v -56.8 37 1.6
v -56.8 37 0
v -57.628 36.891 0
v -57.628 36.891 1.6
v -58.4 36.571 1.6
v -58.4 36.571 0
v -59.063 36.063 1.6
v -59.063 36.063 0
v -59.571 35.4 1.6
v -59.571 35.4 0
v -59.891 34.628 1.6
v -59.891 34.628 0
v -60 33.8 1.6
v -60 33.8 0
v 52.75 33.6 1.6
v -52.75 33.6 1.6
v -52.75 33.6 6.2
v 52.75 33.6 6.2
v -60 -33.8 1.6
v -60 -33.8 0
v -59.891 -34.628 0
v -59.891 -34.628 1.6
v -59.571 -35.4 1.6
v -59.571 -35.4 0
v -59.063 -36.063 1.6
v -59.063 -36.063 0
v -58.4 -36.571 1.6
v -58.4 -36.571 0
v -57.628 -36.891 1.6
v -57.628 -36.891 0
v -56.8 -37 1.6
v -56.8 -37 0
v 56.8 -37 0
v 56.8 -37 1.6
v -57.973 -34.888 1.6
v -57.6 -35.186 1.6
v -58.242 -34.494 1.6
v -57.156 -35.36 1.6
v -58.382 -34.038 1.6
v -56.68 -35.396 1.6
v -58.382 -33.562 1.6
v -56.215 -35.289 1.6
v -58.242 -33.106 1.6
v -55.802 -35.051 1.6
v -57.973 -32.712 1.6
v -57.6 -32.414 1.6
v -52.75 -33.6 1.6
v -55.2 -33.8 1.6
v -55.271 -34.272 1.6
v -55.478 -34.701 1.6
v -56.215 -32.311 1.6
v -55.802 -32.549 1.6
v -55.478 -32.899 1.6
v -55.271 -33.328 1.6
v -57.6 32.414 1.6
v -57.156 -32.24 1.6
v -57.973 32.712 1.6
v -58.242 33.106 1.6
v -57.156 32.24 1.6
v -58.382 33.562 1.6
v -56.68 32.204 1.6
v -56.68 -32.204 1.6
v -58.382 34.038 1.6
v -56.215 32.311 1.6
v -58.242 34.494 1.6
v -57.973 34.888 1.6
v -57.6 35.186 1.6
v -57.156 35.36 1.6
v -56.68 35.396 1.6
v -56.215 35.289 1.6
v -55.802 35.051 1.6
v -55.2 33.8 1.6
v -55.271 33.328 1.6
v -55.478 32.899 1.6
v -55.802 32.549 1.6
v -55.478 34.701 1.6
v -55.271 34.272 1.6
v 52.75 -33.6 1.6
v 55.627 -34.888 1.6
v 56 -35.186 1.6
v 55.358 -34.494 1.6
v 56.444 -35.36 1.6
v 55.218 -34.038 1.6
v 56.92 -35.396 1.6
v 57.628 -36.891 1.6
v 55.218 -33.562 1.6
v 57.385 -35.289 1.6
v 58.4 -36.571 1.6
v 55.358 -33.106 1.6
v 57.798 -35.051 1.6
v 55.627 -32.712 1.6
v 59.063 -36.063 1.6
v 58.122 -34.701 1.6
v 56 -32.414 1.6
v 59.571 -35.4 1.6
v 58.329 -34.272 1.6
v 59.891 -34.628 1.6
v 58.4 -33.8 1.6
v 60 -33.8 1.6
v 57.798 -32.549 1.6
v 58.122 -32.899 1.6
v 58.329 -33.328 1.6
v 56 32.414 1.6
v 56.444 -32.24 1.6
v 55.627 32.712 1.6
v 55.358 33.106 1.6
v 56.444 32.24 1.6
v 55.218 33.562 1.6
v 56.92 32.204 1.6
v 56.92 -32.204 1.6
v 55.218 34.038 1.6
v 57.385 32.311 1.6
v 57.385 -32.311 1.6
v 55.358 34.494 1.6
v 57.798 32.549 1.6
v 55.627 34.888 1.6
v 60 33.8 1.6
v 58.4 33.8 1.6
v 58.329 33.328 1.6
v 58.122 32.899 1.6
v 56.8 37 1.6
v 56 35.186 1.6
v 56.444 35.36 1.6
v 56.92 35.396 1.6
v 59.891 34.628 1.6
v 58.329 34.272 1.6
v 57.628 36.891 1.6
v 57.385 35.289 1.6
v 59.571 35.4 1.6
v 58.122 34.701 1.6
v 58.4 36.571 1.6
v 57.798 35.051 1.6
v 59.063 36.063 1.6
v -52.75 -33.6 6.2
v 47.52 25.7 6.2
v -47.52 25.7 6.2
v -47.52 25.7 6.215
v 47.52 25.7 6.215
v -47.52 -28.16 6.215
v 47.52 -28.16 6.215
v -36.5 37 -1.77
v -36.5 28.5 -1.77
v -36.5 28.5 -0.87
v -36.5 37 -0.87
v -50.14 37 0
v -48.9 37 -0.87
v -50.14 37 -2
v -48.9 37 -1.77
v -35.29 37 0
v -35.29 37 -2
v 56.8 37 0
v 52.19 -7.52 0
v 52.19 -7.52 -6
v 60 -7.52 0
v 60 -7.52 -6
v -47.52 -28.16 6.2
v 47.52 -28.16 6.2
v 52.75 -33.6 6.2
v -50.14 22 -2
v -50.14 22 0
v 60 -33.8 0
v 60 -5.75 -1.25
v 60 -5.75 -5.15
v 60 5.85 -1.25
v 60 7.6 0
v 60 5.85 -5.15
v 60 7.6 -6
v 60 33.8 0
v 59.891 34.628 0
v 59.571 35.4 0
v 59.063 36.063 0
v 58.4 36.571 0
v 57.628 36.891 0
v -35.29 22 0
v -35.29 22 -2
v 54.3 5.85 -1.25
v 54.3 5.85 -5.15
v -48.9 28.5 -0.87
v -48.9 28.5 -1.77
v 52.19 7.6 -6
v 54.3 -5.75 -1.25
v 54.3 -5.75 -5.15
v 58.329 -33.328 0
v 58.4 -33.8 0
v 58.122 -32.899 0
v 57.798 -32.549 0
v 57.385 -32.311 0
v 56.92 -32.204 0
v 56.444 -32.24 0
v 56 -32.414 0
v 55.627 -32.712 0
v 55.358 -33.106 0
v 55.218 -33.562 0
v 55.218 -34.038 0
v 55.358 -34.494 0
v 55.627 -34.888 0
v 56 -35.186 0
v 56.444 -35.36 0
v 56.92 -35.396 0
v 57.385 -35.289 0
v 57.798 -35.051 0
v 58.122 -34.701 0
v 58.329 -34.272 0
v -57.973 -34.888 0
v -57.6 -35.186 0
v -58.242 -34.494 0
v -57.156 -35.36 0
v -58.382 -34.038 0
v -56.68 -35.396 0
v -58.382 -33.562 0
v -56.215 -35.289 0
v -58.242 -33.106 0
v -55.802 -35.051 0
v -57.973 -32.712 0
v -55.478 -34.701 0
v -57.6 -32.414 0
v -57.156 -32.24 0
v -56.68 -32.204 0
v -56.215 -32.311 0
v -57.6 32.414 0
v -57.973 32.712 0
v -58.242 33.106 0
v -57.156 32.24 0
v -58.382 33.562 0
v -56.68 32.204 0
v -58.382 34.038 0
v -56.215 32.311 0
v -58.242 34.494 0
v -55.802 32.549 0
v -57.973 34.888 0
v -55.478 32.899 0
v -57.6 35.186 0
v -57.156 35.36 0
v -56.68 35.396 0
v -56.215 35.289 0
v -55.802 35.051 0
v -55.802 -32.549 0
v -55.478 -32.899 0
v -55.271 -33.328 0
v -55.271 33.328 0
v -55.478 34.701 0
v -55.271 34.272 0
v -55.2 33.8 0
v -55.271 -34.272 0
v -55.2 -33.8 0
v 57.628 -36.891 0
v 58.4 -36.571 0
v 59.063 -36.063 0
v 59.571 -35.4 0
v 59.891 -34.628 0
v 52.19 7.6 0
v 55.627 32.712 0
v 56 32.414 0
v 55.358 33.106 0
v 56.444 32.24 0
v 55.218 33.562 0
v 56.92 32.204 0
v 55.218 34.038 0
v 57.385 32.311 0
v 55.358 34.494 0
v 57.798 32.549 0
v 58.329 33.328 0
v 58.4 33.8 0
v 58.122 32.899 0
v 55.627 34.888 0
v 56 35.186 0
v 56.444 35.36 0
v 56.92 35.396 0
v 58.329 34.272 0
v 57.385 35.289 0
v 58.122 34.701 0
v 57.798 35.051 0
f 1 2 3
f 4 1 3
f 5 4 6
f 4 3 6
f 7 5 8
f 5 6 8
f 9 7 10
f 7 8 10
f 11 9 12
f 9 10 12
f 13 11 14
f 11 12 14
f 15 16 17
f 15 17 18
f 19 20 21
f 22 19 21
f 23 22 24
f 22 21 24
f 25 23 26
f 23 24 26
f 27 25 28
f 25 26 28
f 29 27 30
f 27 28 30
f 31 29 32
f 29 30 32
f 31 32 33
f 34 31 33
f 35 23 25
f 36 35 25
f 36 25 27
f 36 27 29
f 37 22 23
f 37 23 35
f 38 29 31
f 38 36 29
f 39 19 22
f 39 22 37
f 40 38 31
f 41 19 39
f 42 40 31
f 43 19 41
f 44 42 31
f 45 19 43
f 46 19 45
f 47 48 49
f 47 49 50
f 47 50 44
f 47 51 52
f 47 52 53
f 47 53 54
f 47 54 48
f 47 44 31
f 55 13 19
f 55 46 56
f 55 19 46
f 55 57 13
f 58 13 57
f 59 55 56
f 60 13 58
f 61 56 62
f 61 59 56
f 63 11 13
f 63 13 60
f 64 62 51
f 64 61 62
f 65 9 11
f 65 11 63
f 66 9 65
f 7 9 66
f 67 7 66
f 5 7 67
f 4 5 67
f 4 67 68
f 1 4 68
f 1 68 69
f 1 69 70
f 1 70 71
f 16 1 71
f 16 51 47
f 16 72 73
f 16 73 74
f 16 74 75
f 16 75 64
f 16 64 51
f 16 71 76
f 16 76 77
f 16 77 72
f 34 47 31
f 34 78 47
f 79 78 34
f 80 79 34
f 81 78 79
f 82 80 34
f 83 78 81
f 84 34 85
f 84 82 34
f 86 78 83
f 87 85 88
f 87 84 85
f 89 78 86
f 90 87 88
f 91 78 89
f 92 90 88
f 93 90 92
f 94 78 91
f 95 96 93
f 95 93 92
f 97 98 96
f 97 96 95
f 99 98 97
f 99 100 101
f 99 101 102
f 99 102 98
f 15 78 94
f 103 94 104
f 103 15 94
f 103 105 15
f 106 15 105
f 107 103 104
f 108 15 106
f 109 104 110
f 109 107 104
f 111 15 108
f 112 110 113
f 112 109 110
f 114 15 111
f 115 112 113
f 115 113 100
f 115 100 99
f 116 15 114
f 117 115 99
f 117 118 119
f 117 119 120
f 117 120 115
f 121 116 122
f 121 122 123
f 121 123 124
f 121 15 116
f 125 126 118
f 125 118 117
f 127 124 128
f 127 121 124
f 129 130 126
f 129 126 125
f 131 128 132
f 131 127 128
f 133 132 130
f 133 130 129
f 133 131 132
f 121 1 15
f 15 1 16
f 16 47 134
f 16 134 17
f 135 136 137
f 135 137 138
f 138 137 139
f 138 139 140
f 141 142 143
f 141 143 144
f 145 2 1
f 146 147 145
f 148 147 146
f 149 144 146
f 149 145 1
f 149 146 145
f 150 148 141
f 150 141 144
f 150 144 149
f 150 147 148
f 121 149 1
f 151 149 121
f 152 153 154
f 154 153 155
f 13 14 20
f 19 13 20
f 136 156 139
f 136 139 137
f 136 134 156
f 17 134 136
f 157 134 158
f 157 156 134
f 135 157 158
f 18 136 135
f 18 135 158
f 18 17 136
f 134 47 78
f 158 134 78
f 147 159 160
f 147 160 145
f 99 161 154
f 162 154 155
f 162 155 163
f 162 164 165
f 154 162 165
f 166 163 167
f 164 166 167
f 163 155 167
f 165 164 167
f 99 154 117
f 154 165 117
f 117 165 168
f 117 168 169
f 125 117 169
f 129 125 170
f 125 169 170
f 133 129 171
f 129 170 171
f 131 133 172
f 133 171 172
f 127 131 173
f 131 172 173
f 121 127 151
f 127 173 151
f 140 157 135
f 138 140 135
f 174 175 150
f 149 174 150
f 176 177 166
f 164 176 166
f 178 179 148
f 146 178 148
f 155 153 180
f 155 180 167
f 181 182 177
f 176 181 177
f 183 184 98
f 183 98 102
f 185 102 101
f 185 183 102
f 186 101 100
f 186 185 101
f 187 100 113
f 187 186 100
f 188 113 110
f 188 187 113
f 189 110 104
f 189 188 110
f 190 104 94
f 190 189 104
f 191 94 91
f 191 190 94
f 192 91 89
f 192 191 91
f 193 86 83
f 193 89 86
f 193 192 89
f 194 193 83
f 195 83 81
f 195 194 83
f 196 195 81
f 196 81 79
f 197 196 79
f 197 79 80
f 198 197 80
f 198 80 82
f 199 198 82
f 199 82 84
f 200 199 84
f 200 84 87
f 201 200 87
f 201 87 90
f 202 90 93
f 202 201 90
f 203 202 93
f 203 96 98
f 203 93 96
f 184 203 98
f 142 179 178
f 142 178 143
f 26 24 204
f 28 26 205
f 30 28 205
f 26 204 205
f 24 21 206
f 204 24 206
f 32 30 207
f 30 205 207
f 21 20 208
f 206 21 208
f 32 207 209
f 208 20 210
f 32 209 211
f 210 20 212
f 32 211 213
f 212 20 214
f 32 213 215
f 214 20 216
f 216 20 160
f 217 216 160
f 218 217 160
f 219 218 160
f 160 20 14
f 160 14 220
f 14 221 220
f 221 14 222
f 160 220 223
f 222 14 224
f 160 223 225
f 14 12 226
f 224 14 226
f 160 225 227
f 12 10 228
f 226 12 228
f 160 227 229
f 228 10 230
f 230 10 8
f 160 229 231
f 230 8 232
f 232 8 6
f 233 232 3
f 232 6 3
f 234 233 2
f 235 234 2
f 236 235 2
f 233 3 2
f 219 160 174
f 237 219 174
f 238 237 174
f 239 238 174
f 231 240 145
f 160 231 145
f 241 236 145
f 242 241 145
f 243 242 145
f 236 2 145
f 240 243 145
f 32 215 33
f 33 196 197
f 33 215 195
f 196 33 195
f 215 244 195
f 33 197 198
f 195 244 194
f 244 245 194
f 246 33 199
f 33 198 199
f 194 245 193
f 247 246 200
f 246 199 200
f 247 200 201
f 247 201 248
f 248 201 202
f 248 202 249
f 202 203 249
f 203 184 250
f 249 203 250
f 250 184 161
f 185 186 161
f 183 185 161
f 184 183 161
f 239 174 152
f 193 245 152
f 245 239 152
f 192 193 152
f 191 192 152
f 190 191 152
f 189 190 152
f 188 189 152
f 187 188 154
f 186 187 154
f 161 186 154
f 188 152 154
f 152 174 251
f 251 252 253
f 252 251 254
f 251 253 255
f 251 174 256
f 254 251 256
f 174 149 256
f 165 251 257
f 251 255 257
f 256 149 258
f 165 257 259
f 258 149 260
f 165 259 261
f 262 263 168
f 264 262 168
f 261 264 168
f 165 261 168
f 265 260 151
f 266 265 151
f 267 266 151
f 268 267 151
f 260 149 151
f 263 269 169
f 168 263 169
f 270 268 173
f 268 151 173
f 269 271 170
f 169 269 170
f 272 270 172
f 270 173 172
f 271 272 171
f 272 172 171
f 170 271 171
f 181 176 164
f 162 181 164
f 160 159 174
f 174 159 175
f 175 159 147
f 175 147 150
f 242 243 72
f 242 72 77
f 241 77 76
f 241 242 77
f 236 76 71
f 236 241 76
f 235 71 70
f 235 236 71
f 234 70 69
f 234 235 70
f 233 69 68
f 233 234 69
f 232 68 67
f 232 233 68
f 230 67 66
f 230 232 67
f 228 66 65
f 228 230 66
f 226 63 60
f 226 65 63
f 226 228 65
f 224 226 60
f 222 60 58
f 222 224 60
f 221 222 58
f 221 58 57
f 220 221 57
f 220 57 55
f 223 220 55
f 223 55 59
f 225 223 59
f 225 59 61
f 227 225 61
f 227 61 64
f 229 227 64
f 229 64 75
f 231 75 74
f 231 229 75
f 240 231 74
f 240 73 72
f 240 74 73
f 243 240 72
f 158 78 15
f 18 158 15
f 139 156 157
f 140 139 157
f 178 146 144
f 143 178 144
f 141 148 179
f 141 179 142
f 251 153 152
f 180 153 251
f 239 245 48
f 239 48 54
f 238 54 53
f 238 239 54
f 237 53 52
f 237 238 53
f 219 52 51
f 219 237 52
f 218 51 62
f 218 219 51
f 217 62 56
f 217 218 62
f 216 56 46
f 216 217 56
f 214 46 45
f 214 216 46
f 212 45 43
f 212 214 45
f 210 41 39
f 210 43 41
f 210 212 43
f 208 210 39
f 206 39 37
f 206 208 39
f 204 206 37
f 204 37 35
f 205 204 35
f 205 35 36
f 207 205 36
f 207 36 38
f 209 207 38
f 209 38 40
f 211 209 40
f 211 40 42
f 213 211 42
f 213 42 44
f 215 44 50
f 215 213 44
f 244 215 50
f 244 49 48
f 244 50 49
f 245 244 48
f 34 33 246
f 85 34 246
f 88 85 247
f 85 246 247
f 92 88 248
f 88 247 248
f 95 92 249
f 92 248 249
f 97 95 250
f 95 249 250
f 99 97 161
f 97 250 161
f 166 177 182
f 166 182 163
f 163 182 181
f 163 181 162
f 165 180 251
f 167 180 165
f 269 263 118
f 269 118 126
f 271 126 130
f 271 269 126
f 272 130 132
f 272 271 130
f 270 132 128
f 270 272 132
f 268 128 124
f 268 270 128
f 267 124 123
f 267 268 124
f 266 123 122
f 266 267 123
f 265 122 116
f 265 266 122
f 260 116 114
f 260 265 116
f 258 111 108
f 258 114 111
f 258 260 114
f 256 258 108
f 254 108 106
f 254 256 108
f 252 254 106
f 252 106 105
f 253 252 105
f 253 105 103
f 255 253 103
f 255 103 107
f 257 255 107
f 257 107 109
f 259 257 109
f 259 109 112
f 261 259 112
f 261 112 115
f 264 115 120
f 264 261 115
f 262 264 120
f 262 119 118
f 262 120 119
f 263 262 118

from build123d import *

# Parameters (mm, degrees)
F_120_X_74_PCB_OUTLINE_DEPTH               = 1.6
F_4_START                                  = -0.1
F_4_X_D3_2_PITCH_113_6_X_67_6_PROFILE_R    = 1.6
F_4_X_D3_2_PITCH_113_6_X_67_6_DEPTH        = 1.8
F_105_50_START                             = 1.55
F_105_50_X_67_20_LCD_MODULE_PROFILE_W      = 105.5
F_105_50_X_67_20_LCD_MODULE_PROFILE_H      = 67.2
F_105_50_X_67_20_LCD_MODULE_DEPTH          = 3.45
TOUCH_START                                = 4.98
TOUCH_PANEL_BLACK_BORDER_PROFILE_W         = 105.5
TOUCH_PANEL_BLACK_BORDER_PROFILE_H         = 67.2
TOUCH_PANEL_BLACK_BORDER_DEPTH             = 1.22
VISIBLE_START                              = 6.17
VISIBLE_480_X_272_DISPLAY_AREA_PROFILE_W   = 95.04
VISIBLE_480_X_272_DISPLAY_AREA_PROFILE_H   = 53.86
VISIBLE_480_X_272_DISPLAY_AREA_DEPTH       = 0.045
REAR_START                                 = -6
REAR_4_PIN_UART_CONNECTOR_HOUSING_PROFIL_W = 7.81
REAR_4_PIN_UART_CONNECTOR_HOUSING_PROFIL_H = 15.12
REAR_4_PIN_UART_CONNECTOR_HOUSING_DEPTH    = 6.05
UART_START                                 = -5.15
UART_CONNECTOR_SOCKET_PROFILE_W            = 5.9
UART_CONNECTOR_SOCKET_PROFILE_H            = 11.6
UART_CONNECTOR_SOCKET_DEPTH                = 3.9
REAR_START_2                               = -2
REAR_CARD_HOLDER_PROFILE_W                 = 14.85
REAR_CARD_HOLDER_PROFILE_H                 = 15
REAR_CARD_HOLDER_DEPTH                     = 2.05
CARD_START                                 = -1.77
CARD_OPENING_PROFILE_W                     = 12.4
CARD_OPENING_PROFILE_H                     = 8.7
CARD_OPENING_DEPTH                         = 0.9


with BuildPart() as part:
    # 120 x 74 PCB outline profile → 120 x 74 PCB outline (new body)
    with BuildSketch(Plane.XY):
        with BuildLine():
            Line((-56.8, -37), (56.8, -37))
            ThreePointArc((56.8, -37), (59.0627417, -36.0627417), (60, -33.8))
            Line((60, -33.8), (60, 33.8))
            ThreePointArc((60, 33.8), (59.0627417, 36.0627417), (56.8, 37))
            Line((56.8, 37), (-56.8, 37))
            ThreePointArc((-56.8, 37), (-59.0627417, 36.0627417), (-60, 33.8))
            Line((-60, 33.8), (-60, -33.8))
            ThreePointArc((-60, -33.8), (-59.0627417, -36.0627417), (-56.8, -37))
        make_face()
    extrude(amount=F_120_X_74_PCB_OUTLINE_DEPTH)

    # 4 x D3.2 - pitch 113.6 x 67.6 profile → 4 x D3.2 - pitch 113.6 x 67.6 (cut)
    with BuildSketch(Plane.XY.offset(F_4_START)):
        with Locations((-56.8, -33.8)):
            Circle(F_4_X_D3_2_PITCH_113_6_X_67_6_PROFILE_R)
        with Locations((-56.8, 33.8)):
            Circle(F_4_X_D3_2_PITCH_113_6_X_67_6_PROFILE_R)
        with Locations((56.8, -33.8)):
            Circle(F_4_X_D3_2_PITCH_113_6_X_67_6_PROFILE_R)
        with Locations((56.8, 33.8)):
            Circle(F_4_X_D3_2_PITCH_113_6_X_67_6_PROFILE_R)
    extrude(amount=F_4_X_D3_2_PITCH_113_6_X_67_6_DEPTH, mode=Mode.SUBTRACT)

    # 105.50 x 67.20 LCD module profile → 105.50 x 67.20 LCD module (add)
    with BuildSketch(Plane.XY.offset(F_105_50_START)):
        Rectangle(F_105_50_X_67_20_LCD_MODULE_PROFILE_W, F_105_50_X_67_20_LCD_MODULE_PROFILE_H)
    extrude(amount=F_105_50_X_67_20_LCD_MODULE_DEPTH)

    # Touch panel - black border profile → Touch panel - black border (add)
    with BuildSketch(Plane.XY.offset(TOUCH_START)):
        Rectangle(TOUCH_PANEL_BLACK_BORDER_PROFILE_W, TOUCH_PANEL_BLACK_BORDER_PROFILE_H)
    extrude(amount=TOUCH_PANEL_BLACK_BORDER_DEPTH)

    # Visible 480 x 272 display area profile → Visible 480 x 272 display area (add)
    with BuildSketch(Plane.XY.offset(VISIBLE_START)):
        with Locations((0, -1.23)):
            Rectangle(VISIBLE_480_X_272_DISPLAY_AREA_PROFILE_W, VISIBLE_480_X_272_DISPLAY_AREA_PROFILE_H)
    extrude(amount=VISIBLE_480_X_272_DISPLAY_AREA_DEPTH)

    # Rear 4-pin UART connector housing profile → Rear 4-pin UART connector housing (add)
    with BuildSketch(Plane.XY.offset(REAR_START)):
        with Locations((56.095, 0.04)):
            Rectangle(REAR_4_PIN_UART_CONNECTOR_HOUSING_PROFIL_W, REAR_4_PIN_UART_CONNECTOR_HOUSING_PROFIL_H)
    extrude(amount=REAR_4_PIN_UART_CONNECTOR_HOUSING_DEPTH)

    # UART connector socket profile → UART connector socket (cut)
    with BuildSketch(Plane.XY.offset(UART_START)):
        with Locations((57.25, 0.05)):
            Rectangle(UART_CONNECTOR_SOCKET_PROFILE_W, UART_CONNECTOR_SOCKET_PROFILE_H)
    extrude(amount=UART_CONNECTOR_SOCKET_DEPTH, mode=Mode.SUBTRACT)

    # Rear card holder profile → Rear card holder (add)
    with BuildSketch(Plane.XY.offset(REAR_START_2)):
        with Locations((-42.715, 29.5)):
            Rectangle(REAR_CARD_HOLDER_PROFILE_W, REAR_CARD_HOLDER_PROFILE_H)
    extrude(amount=REAR_CARD_HOLDER_DEPTH)

    # Card opening profile → Card opening (cut)
    with BuildSketch(Plane.XY.offset(CARD_START)):
        with Locations((-42.7, 32.85)):
            Rectangle(CARD_OPENING_PROFILE_W, CARD_OPENING_PROFILE_H)
    extrude(amount=CARD_OPENING_DEPTH, mode=Mode.SUBTRACT)


solid = part.part
